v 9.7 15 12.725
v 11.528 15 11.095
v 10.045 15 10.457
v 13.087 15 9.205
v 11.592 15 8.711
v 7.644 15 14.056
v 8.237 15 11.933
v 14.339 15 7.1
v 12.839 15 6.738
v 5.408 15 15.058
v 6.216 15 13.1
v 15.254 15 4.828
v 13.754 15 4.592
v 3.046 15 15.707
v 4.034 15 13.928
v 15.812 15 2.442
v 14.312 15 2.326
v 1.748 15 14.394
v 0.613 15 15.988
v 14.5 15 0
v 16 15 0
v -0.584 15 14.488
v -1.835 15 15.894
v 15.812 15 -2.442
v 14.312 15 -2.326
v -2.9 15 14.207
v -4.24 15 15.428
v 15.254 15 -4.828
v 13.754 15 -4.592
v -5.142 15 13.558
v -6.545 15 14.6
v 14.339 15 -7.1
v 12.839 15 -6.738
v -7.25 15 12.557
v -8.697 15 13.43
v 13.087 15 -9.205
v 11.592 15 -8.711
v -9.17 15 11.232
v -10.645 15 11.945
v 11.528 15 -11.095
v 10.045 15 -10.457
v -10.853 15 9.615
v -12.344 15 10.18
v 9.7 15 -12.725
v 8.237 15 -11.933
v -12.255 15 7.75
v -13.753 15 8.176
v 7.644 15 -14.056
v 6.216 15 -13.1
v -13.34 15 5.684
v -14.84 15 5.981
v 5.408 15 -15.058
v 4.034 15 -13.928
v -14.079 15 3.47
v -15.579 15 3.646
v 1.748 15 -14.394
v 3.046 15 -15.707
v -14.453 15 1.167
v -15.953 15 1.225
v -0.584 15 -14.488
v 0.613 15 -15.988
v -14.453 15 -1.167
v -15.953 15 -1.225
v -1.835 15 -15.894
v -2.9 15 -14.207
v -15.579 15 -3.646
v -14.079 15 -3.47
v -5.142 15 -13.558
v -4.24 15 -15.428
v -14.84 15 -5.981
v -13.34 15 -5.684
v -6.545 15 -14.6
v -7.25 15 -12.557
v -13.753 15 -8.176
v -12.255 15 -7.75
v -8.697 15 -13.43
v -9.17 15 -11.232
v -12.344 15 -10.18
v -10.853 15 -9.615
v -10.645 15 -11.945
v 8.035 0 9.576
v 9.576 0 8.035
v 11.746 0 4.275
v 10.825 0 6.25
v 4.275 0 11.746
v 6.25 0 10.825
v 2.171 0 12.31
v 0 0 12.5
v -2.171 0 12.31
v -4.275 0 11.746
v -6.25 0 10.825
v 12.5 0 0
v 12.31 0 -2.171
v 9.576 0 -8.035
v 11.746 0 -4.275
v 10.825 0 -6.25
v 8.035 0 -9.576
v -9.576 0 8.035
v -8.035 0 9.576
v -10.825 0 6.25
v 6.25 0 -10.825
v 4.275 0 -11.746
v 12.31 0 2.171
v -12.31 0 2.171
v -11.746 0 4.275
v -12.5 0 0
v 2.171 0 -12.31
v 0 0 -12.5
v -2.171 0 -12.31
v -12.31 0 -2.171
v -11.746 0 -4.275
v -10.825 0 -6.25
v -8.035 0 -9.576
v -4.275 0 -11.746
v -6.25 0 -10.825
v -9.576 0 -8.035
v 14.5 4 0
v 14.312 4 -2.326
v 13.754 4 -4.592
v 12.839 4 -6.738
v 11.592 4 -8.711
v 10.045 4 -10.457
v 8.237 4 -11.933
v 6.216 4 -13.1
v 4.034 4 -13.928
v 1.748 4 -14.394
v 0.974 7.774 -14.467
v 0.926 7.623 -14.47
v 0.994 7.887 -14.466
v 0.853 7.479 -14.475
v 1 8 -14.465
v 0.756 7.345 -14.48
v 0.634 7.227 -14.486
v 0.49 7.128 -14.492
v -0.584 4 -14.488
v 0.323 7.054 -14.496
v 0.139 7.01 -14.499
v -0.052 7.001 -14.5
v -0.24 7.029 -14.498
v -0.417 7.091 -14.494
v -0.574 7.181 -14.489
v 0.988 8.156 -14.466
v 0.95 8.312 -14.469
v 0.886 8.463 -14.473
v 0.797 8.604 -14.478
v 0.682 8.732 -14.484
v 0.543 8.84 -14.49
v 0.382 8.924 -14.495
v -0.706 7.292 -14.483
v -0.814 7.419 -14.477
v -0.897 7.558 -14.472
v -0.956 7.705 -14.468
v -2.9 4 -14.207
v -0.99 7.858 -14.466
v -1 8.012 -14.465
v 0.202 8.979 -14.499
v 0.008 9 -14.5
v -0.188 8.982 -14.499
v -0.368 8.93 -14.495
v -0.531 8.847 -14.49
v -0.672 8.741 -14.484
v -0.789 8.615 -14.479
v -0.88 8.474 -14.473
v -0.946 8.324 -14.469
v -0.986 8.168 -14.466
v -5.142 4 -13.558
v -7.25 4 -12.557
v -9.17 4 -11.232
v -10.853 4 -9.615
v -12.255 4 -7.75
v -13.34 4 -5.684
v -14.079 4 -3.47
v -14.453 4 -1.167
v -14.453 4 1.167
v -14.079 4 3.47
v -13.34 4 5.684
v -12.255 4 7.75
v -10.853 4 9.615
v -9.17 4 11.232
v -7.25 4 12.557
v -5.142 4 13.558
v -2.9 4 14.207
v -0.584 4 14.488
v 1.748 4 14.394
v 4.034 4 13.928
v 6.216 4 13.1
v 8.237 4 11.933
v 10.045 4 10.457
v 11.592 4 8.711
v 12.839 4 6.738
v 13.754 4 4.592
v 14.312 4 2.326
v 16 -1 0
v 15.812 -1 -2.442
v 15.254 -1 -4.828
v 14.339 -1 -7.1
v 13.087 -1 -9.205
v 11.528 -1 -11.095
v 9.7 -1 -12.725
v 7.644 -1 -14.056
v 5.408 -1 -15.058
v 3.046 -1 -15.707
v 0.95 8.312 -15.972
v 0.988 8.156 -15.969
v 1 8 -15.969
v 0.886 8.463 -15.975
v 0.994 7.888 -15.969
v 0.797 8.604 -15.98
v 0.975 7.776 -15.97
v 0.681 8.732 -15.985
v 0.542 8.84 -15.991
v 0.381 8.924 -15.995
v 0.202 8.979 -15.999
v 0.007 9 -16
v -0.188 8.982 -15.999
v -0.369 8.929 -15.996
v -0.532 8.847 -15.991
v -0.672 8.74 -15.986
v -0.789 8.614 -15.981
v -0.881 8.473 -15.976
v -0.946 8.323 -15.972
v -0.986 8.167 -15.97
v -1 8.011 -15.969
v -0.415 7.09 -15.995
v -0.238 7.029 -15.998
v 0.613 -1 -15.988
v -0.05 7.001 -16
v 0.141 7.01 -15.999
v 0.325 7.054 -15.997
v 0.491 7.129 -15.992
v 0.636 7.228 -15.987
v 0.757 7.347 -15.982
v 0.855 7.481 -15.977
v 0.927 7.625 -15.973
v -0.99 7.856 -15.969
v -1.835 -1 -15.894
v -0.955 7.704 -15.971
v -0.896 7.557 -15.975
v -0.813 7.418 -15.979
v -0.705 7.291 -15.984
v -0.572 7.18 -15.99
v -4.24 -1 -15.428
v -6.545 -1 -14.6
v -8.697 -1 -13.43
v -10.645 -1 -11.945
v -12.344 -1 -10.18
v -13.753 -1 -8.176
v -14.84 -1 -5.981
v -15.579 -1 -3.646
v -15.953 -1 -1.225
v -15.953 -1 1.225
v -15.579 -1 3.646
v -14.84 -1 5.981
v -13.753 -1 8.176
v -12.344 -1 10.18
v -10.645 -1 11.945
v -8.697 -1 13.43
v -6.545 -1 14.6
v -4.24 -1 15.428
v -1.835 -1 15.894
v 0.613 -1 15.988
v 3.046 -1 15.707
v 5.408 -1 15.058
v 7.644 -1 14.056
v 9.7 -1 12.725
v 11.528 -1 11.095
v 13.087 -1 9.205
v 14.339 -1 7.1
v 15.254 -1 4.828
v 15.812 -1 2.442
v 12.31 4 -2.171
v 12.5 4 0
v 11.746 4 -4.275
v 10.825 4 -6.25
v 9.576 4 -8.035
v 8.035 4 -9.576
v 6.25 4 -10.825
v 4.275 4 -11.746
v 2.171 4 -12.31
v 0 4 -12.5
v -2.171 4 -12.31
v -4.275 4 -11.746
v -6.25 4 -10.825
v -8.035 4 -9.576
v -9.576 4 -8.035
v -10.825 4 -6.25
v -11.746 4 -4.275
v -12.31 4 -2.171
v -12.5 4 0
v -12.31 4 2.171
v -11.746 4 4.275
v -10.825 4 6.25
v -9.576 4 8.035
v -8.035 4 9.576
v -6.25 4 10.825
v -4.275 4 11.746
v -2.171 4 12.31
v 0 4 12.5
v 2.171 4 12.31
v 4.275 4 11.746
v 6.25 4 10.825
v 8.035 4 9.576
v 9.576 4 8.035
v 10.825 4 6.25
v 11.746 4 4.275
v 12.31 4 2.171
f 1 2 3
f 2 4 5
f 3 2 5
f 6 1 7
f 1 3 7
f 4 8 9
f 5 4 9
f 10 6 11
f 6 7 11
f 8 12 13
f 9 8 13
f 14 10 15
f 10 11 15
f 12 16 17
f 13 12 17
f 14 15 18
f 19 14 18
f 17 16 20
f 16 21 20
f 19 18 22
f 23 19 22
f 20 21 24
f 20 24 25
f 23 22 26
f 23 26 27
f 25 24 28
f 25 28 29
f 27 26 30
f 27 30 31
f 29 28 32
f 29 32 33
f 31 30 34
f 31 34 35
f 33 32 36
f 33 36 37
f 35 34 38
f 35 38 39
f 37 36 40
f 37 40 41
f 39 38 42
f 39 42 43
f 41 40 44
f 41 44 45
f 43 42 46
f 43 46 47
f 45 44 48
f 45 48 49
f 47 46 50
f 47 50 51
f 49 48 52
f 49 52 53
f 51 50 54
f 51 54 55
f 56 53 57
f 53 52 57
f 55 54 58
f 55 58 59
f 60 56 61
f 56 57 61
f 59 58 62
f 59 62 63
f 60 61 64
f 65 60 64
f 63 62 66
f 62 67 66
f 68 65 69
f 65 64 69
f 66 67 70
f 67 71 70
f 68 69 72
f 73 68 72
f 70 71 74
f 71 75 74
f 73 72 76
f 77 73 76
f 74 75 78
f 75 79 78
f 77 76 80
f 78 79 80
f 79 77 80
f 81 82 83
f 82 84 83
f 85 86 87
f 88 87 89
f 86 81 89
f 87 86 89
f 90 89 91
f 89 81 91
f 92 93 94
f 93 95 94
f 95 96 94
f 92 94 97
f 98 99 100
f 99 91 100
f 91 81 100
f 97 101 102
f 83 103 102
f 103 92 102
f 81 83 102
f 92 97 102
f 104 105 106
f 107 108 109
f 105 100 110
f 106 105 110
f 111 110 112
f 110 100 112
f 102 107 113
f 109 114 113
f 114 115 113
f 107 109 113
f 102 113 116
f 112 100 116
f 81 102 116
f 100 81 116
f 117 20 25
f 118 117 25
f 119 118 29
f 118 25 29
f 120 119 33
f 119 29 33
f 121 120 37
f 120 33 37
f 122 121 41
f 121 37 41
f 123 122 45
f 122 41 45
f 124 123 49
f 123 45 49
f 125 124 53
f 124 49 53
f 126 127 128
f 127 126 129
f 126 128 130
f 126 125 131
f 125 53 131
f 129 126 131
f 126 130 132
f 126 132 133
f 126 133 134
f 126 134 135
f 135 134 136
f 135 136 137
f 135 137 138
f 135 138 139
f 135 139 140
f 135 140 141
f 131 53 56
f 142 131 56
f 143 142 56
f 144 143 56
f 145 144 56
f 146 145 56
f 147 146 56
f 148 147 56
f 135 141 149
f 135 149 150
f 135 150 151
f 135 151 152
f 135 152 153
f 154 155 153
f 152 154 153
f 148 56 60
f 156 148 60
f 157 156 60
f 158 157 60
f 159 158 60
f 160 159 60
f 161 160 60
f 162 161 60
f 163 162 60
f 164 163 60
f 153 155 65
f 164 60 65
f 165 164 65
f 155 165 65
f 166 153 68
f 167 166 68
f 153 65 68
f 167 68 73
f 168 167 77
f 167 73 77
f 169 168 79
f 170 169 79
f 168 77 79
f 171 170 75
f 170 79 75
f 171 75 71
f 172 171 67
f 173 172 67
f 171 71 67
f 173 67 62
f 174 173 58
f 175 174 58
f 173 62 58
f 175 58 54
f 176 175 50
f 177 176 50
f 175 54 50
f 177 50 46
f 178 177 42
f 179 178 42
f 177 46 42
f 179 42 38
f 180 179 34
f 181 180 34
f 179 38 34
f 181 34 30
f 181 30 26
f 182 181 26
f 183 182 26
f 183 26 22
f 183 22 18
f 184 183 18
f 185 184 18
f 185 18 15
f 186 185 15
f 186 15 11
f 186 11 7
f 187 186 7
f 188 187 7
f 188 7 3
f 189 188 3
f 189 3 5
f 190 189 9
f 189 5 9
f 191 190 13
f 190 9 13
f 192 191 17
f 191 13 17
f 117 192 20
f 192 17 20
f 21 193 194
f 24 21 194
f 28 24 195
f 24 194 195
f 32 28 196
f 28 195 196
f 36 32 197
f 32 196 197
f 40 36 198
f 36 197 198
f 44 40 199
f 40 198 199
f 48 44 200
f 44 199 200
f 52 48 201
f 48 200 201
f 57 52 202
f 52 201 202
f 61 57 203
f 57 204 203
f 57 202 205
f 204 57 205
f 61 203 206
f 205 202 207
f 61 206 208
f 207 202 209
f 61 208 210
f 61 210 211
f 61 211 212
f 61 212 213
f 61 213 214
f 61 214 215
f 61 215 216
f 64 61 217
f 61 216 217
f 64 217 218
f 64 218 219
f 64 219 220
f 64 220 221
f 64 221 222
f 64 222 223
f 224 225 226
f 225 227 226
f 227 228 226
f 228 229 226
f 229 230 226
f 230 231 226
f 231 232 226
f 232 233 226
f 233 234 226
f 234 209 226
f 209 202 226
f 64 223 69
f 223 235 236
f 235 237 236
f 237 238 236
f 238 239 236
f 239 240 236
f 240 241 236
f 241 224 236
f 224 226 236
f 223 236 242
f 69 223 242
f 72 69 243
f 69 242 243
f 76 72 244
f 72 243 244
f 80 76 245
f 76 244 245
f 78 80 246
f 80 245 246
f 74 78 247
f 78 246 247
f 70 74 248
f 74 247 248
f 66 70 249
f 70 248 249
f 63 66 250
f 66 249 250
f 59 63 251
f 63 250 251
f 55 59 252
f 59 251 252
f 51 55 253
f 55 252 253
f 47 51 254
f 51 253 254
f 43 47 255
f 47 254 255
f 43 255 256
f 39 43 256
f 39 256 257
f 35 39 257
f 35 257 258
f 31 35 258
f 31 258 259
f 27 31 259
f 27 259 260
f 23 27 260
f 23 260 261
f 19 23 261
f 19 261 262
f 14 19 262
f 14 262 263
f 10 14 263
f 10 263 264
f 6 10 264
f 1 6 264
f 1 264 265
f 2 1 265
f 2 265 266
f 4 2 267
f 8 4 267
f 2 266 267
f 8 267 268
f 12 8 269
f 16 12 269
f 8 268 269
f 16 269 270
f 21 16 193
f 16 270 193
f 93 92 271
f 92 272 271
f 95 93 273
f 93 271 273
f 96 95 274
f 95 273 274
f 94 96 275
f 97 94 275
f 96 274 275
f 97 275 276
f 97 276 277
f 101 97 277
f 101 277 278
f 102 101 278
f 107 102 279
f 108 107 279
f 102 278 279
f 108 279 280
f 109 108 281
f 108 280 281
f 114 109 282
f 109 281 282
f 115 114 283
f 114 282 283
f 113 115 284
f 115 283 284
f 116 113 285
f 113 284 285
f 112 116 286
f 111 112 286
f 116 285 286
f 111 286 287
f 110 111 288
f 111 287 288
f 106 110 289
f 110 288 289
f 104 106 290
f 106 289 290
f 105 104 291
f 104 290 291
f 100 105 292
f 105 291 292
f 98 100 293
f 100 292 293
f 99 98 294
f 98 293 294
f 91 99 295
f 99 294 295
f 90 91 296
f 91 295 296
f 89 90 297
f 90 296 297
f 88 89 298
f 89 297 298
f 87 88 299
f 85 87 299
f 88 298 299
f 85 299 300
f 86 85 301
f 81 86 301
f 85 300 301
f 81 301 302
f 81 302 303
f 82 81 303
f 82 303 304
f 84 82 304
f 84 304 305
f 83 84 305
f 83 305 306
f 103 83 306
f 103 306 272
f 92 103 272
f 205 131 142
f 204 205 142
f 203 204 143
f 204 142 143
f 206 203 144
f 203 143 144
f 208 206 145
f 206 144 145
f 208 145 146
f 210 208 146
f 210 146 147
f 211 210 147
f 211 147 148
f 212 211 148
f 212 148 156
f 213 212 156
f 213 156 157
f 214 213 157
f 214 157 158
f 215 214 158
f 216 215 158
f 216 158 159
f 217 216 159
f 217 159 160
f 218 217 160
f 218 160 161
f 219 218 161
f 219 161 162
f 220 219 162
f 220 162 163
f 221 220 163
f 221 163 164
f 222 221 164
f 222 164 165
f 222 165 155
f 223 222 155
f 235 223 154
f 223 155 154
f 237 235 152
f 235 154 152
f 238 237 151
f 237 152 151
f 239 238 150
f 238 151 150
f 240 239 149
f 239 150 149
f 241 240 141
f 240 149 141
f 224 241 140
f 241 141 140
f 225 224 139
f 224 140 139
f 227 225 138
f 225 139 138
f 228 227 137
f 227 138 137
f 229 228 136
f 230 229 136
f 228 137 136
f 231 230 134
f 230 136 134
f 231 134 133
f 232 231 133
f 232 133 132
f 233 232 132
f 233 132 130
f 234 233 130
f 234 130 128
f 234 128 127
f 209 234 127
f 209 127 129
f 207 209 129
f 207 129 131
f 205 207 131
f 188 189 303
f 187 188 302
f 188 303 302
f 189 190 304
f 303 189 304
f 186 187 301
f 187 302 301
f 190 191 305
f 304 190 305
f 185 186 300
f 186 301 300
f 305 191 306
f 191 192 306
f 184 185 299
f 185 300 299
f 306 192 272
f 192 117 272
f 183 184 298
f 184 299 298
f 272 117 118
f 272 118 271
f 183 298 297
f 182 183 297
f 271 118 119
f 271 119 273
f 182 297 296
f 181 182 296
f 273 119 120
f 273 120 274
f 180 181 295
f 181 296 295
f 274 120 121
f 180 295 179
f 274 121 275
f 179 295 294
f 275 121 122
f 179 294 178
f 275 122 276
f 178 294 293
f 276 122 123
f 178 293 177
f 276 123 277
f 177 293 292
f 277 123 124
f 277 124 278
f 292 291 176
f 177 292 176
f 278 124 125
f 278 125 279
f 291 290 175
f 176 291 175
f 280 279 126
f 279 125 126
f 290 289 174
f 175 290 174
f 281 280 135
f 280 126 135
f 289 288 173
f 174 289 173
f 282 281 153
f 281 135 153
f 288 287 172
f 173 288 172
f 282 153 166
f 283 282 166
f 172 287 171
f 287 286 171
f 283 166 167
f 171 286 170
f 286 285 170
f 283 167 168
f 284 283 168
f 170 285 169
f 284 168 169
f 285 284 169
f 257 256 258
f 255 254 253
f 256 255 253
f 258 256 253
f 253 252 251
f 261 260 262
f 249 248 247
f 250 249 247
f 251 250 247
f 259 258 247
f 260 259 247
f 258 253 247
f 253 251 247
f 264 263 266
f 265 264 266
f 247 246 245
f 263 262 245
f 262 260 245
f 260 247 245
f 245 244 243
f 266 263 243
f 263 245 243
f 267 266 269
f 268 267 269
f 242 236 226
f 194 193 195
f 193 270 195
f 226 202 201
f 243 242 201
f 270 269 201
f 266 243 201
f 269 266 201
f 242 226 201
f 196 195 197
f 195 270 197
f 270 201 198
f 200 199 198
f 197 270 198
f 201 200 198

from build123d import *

# Parameters (mm, degrees)
CUT_EXTRUDE_1_REACH = 18
SKETCH_2_R          = 1


with BuildPart() as part:
    # Эскиз1 → Повернуть1 (revolve)
    with BuildSketch(Plane.XY):
        Polygon((0, 0), (12.5, 0), (12.5, 4), (14.5, 4), (14.5, 15), (16, 15), (16, -1), (0, -1), align=None)
    revolve(axis=Axis((0, -1, 0), (0, 1, 0)))

    # Эскиз2 → Вырез-Вытянуть1 (cut, up to next)
    with BuildSketch(Plane.XY, mode=Mode.PRIVATE) as cut_extrude_1_sk1:
        with Locations((0, 8)):
            Circle(SKETCH_2_R)
    cut_extrude_1_tool1 = extrude(cut_extrude_1_sk1.sketch, amount=-CUT_EXTRUDE_1_REACH, mode=Mode.PRIVATE) & part.part
    add(cut_extrude_1_tool1.solids().sort_by_distance((0, 8, 0))[0], mode=Mode.SUBTRACT)


solid = part.part
